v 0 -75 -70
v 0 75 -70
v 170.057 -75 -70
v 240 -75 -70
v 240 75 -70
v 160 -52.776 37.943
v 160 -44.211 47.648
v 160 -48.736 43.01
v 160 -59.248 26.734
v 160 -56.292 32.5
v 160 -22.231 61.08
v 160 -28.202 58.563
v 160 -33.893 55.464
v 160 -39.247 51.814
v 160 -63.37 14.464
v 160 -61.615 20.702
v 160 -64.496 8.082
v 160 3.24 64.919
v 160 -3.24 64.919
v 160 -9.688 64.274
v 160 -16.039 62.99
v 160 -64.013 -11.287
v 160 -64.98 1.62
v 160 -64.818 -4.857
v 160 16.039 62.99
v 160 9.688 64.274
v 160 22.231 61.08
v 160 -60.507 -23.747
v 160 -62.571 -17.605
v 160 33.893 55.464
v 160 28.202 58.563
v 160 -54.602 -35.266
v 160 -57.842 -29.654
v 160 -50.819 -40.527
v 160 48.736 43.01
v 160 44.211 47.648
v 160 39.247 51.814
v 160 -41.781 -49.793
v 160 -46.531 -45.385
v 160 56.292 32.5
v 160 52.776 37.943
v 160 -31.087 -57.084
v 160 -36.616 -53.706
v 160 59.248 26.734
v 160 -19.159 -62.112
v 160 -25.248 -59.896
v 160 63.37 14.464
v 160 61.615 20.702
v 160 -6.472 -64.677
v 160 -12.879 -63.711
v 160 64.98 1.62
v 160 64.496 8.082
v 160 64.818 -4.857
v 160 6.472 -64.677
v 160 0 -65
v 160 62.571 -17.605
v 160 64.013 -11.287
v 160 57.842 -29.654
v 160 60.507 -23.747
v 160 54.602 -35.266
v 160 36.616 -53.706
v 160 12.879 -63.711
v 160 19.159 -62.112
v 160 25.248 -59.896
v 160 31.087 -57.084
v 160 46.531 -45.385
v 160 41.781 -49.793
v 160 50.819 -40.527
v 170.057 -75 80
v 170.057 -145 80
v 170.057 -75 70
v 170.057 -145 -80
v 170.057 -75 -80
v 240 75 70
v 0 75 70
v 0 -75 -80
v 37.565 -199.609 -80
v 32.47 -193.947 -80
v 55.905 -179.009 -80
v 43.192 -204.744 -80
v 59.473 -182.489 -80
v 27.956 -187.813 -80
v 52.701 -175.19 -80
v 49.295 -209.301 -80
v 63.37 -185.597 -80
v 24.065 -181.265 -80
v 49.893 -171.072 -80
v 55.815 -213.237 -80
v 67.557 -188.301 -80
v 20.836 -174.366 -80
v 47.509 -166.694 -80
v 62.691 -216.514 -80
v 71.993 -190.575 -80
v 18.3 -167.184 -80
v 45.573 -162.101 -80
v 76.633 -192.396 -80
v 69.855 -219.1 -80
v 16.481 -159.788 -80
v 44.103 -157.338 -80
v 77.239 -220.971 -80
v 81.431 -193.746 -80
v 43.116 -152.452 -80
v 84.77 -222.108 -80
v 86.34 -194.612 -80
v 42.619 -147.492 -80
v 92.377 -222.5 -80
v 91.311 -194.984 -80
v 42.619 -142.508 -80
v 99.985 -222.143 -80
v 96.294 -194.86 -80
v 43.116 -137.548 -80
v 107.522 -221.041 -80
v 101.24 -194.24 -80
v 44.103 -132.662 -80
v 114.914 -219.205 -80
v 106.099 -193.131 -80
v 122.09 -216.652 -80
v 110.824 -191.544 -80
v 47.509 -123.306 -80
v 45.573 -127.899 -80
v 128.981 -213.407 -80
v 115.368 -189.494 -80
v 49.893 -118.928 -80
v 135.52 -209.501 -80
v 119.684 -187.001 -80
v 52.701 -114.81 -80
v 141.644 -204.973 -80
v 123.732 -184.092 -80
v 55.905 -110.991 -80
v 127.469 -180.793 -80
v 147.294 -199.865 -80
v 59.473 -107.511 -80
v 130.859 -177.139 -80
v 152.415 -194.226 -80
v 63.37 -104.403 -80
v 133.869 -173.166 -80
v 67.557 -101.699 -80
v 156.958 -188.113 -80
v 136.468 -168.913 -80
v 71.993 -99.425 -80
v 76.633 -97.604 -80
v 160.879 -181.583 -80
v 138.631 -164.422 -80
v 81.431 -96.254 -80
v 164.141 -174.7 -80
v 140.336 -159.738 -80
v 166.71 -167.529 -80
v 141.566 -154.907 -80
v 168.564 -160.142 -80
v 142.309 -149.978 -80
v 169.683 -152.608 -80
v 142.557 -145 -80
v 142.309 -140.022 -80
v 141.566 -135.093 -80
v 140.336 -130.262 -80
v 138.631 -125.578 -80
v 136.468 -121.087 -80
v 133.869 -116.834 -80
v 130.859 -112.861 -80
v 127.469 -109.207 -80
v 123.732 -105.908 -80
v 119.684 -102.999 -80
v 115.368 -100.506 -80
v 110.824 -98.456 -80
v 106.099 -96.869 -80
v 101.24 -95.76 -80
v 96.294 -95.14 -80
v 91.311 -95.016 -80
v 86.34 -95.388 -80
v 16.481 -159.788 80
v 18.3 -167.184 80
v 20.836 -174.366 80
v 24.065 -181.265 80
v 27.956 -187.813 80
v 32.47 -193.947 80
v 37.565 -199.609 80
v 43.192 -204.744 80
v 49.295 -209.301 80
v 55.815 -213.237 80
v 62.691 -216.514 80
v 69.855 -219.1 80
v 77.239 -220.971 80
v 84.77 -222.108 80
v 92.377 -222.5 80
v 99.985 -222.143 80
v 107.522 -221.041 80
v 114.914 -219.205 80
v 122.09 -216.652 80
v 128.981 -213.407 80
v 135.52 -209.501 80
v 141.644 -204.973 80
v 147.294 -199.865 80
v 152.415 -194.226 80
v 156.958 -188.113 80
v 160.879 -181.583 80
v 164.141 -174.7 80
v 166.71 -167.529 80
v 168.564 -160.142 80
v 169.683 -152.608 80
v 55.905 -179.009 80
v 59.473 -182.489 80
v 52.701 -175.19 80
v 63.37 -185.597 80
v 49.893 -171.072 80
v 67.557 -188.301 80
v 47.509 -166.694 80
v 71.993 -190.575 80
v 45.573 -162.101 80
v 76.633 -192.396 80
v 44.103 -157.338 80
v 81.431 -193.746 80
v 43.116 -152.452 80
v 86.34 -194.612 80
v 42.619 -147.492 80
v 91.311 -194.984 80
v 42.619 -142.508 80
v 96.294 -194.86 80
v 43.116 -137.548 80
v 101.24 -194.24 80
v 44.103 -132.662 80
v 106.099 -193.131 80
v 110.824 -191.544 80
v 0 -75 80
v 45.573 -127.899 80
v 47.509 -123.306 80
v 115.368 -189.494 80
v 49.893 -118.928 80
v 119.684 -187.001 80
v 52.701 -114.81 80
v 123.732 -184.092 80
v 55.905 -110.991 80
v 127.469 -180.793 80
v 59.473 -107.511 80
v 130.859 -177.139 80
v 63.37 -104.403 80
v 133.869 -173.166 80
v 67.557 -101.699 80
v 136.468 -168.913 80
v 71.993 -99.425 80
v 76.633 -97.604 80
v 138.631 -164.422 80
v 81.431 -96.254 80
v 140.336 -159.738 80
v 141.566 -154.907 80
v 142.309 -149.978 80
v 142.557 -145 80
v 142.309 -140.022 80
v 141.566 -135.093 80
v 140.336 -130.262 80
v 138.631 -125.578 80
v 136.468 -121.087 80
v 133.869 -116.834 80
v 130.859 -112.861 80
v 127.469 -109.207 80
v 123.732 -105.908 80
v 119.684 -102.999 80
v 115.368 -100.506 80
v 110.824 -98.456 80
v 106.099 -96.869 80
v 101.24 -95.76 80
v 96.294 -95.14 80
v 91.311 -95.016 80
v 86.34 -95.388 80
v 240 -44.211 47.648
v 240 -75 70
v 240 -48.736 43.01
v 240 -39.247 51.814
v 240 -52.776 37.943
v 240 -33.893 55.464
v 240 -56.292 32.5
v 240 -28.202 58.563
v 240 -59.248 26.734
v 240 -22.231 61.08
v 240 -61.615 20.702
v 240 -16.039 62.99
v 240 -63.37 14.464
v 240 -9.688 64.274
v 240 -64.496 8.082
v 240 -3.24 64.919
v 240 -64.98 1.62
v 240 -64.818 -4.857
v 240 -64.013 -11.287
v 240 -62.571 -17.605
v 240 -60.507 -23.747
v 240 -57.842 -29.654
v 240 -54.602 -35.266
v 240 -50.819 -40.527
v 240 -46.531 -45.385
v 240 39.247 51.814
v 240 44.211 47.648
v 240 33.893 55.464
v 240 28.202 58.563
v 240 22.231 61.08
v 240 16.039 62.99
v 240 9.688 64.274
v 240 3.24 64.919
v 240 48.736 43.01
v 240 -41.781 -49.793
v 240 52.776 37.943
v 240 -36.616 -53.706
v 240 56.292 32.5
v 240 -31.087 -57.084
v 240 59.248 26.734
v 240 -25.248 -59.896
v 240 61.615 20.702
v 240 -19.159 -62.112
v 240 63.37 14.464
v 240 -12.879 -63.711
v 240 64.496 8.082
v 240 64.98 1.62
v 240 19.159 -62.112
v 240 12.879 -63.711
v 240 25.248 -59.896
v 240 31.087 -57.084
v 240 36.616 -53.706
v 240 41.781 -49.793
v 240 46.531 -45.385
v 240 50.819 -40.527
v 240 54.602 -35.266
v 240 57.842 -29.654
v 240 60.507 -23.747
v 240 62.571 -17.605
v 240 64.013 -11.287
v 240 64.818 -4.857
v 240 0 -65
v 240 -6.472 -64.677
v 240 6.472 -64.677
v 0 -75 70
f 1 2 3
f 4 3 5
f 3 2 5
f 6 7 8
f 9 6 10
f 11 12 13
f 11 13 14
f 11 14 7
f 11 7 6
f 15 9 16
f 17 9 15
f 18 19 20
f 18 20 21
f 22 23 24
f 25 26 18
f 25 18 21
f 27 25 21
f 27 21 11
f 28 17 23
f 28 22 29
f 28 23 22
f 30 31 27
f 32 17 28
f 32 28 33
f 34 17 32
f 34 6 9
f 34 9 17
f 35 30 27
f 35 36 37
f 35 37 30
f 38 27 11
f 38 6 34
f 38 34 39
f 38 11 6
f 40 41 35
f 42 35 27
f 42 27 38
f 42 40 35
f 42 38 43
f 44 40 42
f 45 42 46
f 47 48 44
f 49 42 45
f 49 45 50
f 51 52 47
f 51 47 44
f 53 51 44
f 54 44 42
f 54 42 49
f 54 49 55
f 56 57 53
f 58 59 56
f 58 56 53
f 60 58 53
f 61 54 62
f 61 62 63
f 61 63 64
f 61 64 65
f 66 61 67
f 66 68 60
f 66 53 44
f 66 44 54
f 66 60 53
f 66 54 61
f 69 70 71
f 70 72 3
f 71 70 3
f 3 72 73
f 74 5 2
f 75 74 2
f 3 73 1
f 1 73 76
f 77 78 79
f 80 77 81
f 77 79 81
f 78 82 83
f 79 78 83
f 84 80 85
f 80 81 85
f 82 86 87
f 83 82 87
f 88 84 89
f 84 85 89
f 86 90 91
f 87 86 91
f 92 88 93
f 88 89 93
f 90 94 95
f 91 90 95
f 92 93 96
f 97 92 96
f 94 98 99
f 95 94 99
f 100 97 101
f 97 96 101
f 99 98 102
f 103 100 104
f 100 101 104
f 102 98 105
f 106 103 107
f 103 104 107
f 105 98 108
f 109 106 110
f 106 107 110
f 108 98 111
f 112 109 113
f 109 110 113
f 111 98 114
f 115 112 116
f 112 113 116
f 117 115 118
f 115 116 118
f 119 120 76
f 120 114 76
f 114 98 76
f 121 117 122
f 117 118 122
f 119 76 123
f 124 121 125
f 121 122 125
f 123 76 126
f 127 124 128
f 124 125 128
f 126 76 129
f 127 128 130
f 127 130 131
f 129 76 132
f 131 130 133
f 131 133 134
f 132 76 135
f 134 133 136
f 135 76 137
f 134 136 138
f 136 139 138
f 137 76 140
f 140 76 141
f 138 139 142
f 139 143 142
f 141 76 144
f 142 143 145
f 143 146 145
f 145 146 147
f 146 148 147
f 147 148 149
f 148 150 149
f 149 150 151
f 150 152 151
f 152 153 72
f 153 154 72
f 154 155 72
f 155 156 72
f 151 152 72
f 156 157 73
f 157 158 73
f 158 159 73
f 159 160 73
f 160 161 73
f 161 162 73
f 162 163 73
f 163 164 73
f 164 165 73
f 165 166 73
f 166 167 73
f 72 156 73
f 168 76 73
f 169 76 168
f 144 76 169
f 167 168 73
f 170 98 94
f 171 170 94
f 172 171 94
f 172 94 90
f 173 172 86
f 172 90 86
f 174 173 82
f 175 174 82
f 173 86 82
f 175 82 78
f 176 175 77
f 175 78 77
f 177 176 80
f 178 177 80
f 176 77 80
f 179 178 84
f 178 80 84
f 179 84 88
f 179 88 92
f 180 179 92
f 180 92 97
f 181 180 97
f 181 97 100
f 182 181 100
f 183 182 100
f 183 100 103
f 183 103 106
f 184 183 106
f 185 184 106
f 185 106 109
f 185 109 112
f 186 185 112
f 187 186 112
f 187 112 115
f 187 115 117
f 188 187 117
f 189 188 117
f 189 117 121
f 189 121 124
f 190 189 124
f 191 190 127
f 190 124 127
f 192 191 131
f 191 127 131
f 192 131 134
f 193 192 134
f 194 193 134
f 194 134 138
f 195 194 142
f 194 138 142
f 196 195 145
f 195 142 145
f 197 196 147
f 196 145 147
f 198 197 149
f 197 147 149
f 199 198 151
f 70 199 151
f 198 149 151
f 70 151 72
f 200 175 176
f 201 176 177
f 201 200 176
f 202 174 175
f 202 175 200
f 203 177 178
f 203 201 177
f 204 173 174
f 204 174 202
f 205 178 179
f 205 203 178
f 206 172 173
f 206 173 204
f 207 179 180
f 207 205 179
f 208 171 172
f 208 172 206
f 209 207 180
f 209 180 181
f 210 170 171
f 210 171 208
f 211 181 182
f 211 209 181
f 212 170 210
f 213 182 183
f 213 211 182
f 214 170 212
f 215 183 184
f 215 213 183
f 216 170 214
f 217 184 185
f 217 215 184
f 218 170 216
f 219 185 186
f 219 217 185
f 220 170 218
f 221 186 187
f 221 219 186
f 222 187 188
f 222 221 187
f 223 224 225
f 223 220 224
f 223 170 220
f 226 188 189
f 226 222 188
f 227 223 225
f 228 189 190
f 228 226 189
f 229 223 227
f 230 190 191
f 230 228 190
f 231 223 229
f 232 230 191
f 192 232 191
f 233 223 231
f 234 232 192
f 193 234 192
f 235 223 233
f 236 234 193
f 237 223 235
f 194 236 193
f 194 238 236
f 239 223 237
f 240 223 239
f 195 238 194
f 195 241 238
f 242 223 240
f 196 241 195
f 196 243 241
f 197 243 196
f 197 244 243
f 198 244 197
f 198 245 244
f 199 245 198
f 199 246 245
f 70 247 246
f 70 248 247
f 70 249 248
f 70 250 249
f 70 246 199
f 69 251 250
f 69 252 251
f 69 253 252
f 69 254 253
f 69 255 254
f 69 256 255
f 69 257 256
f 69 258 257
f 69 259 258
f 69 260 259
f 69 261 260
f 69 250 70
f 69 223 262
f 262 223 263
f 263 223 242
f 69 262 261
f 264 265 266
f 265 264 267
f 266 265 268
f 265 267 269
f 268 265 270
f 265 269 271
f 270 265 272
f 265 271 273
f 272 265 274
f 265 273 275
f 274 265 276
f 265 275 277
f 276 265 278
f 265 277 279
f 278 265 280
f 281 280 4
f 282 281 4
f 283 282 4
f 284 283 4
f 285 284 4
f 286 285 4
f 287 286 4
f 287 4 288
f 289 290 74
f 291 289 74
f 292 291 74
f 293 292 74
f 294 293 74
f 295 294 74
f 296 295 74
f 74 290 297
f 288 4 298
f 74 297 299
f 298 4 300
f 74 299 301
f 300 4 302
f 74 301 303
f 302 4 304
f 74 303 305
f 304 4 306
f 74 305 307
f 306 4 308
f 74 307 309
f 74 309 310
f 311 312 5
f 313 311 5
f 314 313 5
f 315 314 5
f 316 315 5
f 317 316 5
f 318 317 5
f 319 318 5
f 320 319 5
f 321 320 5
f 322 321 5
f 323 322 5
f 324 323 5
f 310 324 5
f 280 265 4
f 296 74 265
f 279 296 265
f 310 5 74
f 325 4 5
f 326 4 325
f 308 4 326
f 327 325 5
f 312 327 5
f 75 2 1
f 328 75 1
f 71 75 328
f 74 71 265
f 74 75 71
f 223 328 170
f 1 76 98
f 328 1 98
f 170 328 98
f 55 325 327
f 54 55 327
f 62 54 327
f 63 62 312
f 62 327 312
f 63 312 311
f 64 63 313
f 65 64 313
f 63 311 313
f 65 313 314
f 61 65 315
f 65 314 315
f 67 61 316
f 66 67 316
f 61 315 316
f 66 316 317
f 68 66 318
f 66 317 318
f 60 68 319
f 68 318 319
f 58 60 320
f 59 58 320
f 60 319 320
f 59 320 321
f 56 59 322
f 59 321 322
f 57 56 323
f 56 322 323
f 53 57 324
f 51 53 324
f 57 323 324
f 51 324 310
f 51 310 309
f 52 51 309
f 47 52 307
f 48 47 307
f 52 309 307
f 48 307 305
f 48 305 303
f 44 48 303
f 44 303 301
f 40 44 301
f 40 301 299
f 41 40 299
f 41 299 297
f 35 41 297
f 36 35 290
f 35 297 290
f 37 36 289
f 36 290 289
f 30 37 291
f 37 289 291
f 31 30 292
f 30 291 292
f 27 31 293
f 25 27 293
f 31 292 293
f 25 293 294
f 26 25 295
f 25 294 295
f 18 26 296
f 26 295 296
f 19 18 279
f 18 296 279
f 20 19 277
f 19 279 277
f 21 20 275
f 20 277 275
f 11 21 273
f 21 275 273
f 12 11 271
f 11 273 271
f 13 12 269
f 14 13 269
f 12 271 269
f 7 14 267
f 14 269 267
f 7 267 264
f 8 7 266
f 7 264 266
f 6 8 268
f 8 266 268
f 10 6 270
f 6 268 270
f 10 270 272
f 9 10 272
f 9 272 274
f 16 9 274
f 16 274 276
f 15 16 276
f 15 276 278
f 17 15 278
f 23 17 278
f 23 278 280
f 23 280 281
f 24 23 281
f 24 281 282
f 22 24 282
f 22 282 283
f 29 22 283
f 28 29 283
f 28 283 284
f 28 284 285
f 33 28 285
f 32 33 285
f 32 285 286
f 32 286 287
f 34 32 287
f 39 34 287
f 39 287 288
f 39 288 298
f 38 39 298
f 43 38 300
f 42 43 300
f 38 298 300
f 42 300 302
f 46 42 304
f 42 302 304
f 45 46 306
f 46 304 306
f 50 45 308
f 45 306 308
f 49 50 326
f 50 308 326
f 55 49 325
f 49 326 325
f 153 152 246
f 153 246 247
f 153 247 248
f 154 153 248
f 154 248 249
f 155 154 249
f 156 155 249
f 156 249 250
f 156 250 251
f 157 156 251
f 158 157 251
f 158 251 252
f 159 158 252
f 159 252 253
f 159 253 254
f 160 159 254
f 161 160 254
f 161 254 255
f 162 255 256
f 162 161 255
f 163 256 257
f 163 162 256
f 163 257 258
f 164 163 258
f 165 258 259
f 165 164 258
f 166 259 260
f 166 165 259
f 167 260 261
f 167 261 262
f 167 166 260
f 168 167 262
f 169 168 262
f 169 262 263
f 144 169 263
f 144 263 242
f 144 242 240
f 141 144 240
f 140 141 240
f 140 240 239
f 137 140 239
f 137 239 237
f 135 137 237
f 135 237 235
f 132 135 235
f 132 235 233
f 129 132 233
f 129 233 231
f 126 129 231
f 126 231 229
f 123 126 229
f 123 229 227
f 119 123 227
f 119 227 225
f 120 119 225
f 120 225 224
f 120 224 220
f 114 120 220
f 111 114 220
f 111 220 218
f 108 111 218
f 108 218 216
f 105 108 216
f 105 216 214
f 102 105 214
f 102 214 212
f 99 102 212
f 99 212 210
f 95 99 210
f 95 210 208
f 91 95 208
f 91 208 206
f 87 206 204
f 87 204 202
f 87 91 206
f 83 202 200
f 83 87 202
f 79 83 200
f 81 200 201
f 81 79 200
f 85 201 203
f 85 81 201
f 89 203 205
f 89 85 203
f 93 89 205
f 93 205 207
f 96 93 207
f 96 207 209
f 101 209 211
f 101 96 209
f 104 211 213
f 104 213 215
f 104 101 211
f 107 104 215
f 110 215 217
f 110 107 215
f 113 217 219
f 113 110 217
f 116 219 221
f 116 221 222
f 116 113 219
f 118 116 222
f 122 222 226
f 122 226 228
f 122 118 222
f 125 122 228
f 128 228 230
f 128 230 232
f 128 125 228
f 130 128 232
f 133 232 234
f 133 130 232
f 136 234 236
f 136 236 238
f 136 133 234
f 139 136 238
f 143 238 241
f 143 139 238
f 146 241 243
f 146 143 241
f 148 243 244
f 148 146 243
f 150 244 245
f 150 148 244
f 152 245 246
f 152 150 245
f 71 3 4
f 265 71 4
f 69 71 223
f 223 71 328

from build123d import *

# Parameters (mm, degrees)
STOCK_4_1_START       = -70
STOCK_4_1_OUTLINE_R   = 50
STOCK_4_1_DEPTH       = 140
STOCK_4_1_START_2     = -80
STOCK_4_1_2_OUTLINE_R = 50
STOCK_4_1_2_DEPTH     = 160
SKETCH1_R             = 65
CUT_EXTRUDE1_DEPTH    = 80


# Read off the part's stored shape, not the designer's step: Stock-4-1
with BuildPart() as part:
    # Stock-4-1 outline → Stock-4-1 (new body)
    with BuildSketch(Plane.XY.offset(STOCK_4_1_START)):
        with BuildLine():
            Line((170.057165499, -75), (240, -75))
            Line((240, -75), (240, 75))
            Line((240, 75), (0, 75))
            Line((0, 75), (0, -75))
            Line((0, -75), (16.481058781, -159.787697142))
            ThreePointArc((16.481058781, -159.787697142), (99.985211319, -222.143205373), (170.057165499, -145))
            Line((170.057165499, -145), (170.057165499, -75))
        make_face()
        with Locations((92.557165499, -145)):
            Circle(STOCK_4_1_OUTLINE_R, mode=Mode.SUBTRACT)
    extrude(amount=STOCK_4_1_DEPTH)

    # Stock-4-1 2 outline → Stock-4-1 2 (add)
    with BuildSketch(Plane.XY.offset(STOCK_4_1_START_2)):
        with BuildLine():
            Line((170.057165499, -145), (170.057165499, -75))
            Line((170.057165499, -75), (0, -75))
            Line((0, -75), (16.481058781, -159.787697142))
            ThreePointArc((16.481058781, -159.787697142), (99.985211319, -222.143205373), (170.057165499, -145))
        make_face()
        with Locations((92.557165499, -145)):
            Circle(STOCK_4_1_2_OUTLINE_R, mode=Mode.SUBTRACT)
    extrude(amount=STOCK_4_1_2_DEPTH)

    # Sketch1 → Cut-Extrude1 (cut)
    with BuildSketch(Plane(origin=(240, 0, 0), x_dir=(0, 0, -1), z_dir=(1, 0, 0))):
        Circle(SKETCH1_R)
    extrude(amount=-CUT_EXTRUDE1_DEPTH, mode=Mode.SUBTRACT)


solid = part.part
